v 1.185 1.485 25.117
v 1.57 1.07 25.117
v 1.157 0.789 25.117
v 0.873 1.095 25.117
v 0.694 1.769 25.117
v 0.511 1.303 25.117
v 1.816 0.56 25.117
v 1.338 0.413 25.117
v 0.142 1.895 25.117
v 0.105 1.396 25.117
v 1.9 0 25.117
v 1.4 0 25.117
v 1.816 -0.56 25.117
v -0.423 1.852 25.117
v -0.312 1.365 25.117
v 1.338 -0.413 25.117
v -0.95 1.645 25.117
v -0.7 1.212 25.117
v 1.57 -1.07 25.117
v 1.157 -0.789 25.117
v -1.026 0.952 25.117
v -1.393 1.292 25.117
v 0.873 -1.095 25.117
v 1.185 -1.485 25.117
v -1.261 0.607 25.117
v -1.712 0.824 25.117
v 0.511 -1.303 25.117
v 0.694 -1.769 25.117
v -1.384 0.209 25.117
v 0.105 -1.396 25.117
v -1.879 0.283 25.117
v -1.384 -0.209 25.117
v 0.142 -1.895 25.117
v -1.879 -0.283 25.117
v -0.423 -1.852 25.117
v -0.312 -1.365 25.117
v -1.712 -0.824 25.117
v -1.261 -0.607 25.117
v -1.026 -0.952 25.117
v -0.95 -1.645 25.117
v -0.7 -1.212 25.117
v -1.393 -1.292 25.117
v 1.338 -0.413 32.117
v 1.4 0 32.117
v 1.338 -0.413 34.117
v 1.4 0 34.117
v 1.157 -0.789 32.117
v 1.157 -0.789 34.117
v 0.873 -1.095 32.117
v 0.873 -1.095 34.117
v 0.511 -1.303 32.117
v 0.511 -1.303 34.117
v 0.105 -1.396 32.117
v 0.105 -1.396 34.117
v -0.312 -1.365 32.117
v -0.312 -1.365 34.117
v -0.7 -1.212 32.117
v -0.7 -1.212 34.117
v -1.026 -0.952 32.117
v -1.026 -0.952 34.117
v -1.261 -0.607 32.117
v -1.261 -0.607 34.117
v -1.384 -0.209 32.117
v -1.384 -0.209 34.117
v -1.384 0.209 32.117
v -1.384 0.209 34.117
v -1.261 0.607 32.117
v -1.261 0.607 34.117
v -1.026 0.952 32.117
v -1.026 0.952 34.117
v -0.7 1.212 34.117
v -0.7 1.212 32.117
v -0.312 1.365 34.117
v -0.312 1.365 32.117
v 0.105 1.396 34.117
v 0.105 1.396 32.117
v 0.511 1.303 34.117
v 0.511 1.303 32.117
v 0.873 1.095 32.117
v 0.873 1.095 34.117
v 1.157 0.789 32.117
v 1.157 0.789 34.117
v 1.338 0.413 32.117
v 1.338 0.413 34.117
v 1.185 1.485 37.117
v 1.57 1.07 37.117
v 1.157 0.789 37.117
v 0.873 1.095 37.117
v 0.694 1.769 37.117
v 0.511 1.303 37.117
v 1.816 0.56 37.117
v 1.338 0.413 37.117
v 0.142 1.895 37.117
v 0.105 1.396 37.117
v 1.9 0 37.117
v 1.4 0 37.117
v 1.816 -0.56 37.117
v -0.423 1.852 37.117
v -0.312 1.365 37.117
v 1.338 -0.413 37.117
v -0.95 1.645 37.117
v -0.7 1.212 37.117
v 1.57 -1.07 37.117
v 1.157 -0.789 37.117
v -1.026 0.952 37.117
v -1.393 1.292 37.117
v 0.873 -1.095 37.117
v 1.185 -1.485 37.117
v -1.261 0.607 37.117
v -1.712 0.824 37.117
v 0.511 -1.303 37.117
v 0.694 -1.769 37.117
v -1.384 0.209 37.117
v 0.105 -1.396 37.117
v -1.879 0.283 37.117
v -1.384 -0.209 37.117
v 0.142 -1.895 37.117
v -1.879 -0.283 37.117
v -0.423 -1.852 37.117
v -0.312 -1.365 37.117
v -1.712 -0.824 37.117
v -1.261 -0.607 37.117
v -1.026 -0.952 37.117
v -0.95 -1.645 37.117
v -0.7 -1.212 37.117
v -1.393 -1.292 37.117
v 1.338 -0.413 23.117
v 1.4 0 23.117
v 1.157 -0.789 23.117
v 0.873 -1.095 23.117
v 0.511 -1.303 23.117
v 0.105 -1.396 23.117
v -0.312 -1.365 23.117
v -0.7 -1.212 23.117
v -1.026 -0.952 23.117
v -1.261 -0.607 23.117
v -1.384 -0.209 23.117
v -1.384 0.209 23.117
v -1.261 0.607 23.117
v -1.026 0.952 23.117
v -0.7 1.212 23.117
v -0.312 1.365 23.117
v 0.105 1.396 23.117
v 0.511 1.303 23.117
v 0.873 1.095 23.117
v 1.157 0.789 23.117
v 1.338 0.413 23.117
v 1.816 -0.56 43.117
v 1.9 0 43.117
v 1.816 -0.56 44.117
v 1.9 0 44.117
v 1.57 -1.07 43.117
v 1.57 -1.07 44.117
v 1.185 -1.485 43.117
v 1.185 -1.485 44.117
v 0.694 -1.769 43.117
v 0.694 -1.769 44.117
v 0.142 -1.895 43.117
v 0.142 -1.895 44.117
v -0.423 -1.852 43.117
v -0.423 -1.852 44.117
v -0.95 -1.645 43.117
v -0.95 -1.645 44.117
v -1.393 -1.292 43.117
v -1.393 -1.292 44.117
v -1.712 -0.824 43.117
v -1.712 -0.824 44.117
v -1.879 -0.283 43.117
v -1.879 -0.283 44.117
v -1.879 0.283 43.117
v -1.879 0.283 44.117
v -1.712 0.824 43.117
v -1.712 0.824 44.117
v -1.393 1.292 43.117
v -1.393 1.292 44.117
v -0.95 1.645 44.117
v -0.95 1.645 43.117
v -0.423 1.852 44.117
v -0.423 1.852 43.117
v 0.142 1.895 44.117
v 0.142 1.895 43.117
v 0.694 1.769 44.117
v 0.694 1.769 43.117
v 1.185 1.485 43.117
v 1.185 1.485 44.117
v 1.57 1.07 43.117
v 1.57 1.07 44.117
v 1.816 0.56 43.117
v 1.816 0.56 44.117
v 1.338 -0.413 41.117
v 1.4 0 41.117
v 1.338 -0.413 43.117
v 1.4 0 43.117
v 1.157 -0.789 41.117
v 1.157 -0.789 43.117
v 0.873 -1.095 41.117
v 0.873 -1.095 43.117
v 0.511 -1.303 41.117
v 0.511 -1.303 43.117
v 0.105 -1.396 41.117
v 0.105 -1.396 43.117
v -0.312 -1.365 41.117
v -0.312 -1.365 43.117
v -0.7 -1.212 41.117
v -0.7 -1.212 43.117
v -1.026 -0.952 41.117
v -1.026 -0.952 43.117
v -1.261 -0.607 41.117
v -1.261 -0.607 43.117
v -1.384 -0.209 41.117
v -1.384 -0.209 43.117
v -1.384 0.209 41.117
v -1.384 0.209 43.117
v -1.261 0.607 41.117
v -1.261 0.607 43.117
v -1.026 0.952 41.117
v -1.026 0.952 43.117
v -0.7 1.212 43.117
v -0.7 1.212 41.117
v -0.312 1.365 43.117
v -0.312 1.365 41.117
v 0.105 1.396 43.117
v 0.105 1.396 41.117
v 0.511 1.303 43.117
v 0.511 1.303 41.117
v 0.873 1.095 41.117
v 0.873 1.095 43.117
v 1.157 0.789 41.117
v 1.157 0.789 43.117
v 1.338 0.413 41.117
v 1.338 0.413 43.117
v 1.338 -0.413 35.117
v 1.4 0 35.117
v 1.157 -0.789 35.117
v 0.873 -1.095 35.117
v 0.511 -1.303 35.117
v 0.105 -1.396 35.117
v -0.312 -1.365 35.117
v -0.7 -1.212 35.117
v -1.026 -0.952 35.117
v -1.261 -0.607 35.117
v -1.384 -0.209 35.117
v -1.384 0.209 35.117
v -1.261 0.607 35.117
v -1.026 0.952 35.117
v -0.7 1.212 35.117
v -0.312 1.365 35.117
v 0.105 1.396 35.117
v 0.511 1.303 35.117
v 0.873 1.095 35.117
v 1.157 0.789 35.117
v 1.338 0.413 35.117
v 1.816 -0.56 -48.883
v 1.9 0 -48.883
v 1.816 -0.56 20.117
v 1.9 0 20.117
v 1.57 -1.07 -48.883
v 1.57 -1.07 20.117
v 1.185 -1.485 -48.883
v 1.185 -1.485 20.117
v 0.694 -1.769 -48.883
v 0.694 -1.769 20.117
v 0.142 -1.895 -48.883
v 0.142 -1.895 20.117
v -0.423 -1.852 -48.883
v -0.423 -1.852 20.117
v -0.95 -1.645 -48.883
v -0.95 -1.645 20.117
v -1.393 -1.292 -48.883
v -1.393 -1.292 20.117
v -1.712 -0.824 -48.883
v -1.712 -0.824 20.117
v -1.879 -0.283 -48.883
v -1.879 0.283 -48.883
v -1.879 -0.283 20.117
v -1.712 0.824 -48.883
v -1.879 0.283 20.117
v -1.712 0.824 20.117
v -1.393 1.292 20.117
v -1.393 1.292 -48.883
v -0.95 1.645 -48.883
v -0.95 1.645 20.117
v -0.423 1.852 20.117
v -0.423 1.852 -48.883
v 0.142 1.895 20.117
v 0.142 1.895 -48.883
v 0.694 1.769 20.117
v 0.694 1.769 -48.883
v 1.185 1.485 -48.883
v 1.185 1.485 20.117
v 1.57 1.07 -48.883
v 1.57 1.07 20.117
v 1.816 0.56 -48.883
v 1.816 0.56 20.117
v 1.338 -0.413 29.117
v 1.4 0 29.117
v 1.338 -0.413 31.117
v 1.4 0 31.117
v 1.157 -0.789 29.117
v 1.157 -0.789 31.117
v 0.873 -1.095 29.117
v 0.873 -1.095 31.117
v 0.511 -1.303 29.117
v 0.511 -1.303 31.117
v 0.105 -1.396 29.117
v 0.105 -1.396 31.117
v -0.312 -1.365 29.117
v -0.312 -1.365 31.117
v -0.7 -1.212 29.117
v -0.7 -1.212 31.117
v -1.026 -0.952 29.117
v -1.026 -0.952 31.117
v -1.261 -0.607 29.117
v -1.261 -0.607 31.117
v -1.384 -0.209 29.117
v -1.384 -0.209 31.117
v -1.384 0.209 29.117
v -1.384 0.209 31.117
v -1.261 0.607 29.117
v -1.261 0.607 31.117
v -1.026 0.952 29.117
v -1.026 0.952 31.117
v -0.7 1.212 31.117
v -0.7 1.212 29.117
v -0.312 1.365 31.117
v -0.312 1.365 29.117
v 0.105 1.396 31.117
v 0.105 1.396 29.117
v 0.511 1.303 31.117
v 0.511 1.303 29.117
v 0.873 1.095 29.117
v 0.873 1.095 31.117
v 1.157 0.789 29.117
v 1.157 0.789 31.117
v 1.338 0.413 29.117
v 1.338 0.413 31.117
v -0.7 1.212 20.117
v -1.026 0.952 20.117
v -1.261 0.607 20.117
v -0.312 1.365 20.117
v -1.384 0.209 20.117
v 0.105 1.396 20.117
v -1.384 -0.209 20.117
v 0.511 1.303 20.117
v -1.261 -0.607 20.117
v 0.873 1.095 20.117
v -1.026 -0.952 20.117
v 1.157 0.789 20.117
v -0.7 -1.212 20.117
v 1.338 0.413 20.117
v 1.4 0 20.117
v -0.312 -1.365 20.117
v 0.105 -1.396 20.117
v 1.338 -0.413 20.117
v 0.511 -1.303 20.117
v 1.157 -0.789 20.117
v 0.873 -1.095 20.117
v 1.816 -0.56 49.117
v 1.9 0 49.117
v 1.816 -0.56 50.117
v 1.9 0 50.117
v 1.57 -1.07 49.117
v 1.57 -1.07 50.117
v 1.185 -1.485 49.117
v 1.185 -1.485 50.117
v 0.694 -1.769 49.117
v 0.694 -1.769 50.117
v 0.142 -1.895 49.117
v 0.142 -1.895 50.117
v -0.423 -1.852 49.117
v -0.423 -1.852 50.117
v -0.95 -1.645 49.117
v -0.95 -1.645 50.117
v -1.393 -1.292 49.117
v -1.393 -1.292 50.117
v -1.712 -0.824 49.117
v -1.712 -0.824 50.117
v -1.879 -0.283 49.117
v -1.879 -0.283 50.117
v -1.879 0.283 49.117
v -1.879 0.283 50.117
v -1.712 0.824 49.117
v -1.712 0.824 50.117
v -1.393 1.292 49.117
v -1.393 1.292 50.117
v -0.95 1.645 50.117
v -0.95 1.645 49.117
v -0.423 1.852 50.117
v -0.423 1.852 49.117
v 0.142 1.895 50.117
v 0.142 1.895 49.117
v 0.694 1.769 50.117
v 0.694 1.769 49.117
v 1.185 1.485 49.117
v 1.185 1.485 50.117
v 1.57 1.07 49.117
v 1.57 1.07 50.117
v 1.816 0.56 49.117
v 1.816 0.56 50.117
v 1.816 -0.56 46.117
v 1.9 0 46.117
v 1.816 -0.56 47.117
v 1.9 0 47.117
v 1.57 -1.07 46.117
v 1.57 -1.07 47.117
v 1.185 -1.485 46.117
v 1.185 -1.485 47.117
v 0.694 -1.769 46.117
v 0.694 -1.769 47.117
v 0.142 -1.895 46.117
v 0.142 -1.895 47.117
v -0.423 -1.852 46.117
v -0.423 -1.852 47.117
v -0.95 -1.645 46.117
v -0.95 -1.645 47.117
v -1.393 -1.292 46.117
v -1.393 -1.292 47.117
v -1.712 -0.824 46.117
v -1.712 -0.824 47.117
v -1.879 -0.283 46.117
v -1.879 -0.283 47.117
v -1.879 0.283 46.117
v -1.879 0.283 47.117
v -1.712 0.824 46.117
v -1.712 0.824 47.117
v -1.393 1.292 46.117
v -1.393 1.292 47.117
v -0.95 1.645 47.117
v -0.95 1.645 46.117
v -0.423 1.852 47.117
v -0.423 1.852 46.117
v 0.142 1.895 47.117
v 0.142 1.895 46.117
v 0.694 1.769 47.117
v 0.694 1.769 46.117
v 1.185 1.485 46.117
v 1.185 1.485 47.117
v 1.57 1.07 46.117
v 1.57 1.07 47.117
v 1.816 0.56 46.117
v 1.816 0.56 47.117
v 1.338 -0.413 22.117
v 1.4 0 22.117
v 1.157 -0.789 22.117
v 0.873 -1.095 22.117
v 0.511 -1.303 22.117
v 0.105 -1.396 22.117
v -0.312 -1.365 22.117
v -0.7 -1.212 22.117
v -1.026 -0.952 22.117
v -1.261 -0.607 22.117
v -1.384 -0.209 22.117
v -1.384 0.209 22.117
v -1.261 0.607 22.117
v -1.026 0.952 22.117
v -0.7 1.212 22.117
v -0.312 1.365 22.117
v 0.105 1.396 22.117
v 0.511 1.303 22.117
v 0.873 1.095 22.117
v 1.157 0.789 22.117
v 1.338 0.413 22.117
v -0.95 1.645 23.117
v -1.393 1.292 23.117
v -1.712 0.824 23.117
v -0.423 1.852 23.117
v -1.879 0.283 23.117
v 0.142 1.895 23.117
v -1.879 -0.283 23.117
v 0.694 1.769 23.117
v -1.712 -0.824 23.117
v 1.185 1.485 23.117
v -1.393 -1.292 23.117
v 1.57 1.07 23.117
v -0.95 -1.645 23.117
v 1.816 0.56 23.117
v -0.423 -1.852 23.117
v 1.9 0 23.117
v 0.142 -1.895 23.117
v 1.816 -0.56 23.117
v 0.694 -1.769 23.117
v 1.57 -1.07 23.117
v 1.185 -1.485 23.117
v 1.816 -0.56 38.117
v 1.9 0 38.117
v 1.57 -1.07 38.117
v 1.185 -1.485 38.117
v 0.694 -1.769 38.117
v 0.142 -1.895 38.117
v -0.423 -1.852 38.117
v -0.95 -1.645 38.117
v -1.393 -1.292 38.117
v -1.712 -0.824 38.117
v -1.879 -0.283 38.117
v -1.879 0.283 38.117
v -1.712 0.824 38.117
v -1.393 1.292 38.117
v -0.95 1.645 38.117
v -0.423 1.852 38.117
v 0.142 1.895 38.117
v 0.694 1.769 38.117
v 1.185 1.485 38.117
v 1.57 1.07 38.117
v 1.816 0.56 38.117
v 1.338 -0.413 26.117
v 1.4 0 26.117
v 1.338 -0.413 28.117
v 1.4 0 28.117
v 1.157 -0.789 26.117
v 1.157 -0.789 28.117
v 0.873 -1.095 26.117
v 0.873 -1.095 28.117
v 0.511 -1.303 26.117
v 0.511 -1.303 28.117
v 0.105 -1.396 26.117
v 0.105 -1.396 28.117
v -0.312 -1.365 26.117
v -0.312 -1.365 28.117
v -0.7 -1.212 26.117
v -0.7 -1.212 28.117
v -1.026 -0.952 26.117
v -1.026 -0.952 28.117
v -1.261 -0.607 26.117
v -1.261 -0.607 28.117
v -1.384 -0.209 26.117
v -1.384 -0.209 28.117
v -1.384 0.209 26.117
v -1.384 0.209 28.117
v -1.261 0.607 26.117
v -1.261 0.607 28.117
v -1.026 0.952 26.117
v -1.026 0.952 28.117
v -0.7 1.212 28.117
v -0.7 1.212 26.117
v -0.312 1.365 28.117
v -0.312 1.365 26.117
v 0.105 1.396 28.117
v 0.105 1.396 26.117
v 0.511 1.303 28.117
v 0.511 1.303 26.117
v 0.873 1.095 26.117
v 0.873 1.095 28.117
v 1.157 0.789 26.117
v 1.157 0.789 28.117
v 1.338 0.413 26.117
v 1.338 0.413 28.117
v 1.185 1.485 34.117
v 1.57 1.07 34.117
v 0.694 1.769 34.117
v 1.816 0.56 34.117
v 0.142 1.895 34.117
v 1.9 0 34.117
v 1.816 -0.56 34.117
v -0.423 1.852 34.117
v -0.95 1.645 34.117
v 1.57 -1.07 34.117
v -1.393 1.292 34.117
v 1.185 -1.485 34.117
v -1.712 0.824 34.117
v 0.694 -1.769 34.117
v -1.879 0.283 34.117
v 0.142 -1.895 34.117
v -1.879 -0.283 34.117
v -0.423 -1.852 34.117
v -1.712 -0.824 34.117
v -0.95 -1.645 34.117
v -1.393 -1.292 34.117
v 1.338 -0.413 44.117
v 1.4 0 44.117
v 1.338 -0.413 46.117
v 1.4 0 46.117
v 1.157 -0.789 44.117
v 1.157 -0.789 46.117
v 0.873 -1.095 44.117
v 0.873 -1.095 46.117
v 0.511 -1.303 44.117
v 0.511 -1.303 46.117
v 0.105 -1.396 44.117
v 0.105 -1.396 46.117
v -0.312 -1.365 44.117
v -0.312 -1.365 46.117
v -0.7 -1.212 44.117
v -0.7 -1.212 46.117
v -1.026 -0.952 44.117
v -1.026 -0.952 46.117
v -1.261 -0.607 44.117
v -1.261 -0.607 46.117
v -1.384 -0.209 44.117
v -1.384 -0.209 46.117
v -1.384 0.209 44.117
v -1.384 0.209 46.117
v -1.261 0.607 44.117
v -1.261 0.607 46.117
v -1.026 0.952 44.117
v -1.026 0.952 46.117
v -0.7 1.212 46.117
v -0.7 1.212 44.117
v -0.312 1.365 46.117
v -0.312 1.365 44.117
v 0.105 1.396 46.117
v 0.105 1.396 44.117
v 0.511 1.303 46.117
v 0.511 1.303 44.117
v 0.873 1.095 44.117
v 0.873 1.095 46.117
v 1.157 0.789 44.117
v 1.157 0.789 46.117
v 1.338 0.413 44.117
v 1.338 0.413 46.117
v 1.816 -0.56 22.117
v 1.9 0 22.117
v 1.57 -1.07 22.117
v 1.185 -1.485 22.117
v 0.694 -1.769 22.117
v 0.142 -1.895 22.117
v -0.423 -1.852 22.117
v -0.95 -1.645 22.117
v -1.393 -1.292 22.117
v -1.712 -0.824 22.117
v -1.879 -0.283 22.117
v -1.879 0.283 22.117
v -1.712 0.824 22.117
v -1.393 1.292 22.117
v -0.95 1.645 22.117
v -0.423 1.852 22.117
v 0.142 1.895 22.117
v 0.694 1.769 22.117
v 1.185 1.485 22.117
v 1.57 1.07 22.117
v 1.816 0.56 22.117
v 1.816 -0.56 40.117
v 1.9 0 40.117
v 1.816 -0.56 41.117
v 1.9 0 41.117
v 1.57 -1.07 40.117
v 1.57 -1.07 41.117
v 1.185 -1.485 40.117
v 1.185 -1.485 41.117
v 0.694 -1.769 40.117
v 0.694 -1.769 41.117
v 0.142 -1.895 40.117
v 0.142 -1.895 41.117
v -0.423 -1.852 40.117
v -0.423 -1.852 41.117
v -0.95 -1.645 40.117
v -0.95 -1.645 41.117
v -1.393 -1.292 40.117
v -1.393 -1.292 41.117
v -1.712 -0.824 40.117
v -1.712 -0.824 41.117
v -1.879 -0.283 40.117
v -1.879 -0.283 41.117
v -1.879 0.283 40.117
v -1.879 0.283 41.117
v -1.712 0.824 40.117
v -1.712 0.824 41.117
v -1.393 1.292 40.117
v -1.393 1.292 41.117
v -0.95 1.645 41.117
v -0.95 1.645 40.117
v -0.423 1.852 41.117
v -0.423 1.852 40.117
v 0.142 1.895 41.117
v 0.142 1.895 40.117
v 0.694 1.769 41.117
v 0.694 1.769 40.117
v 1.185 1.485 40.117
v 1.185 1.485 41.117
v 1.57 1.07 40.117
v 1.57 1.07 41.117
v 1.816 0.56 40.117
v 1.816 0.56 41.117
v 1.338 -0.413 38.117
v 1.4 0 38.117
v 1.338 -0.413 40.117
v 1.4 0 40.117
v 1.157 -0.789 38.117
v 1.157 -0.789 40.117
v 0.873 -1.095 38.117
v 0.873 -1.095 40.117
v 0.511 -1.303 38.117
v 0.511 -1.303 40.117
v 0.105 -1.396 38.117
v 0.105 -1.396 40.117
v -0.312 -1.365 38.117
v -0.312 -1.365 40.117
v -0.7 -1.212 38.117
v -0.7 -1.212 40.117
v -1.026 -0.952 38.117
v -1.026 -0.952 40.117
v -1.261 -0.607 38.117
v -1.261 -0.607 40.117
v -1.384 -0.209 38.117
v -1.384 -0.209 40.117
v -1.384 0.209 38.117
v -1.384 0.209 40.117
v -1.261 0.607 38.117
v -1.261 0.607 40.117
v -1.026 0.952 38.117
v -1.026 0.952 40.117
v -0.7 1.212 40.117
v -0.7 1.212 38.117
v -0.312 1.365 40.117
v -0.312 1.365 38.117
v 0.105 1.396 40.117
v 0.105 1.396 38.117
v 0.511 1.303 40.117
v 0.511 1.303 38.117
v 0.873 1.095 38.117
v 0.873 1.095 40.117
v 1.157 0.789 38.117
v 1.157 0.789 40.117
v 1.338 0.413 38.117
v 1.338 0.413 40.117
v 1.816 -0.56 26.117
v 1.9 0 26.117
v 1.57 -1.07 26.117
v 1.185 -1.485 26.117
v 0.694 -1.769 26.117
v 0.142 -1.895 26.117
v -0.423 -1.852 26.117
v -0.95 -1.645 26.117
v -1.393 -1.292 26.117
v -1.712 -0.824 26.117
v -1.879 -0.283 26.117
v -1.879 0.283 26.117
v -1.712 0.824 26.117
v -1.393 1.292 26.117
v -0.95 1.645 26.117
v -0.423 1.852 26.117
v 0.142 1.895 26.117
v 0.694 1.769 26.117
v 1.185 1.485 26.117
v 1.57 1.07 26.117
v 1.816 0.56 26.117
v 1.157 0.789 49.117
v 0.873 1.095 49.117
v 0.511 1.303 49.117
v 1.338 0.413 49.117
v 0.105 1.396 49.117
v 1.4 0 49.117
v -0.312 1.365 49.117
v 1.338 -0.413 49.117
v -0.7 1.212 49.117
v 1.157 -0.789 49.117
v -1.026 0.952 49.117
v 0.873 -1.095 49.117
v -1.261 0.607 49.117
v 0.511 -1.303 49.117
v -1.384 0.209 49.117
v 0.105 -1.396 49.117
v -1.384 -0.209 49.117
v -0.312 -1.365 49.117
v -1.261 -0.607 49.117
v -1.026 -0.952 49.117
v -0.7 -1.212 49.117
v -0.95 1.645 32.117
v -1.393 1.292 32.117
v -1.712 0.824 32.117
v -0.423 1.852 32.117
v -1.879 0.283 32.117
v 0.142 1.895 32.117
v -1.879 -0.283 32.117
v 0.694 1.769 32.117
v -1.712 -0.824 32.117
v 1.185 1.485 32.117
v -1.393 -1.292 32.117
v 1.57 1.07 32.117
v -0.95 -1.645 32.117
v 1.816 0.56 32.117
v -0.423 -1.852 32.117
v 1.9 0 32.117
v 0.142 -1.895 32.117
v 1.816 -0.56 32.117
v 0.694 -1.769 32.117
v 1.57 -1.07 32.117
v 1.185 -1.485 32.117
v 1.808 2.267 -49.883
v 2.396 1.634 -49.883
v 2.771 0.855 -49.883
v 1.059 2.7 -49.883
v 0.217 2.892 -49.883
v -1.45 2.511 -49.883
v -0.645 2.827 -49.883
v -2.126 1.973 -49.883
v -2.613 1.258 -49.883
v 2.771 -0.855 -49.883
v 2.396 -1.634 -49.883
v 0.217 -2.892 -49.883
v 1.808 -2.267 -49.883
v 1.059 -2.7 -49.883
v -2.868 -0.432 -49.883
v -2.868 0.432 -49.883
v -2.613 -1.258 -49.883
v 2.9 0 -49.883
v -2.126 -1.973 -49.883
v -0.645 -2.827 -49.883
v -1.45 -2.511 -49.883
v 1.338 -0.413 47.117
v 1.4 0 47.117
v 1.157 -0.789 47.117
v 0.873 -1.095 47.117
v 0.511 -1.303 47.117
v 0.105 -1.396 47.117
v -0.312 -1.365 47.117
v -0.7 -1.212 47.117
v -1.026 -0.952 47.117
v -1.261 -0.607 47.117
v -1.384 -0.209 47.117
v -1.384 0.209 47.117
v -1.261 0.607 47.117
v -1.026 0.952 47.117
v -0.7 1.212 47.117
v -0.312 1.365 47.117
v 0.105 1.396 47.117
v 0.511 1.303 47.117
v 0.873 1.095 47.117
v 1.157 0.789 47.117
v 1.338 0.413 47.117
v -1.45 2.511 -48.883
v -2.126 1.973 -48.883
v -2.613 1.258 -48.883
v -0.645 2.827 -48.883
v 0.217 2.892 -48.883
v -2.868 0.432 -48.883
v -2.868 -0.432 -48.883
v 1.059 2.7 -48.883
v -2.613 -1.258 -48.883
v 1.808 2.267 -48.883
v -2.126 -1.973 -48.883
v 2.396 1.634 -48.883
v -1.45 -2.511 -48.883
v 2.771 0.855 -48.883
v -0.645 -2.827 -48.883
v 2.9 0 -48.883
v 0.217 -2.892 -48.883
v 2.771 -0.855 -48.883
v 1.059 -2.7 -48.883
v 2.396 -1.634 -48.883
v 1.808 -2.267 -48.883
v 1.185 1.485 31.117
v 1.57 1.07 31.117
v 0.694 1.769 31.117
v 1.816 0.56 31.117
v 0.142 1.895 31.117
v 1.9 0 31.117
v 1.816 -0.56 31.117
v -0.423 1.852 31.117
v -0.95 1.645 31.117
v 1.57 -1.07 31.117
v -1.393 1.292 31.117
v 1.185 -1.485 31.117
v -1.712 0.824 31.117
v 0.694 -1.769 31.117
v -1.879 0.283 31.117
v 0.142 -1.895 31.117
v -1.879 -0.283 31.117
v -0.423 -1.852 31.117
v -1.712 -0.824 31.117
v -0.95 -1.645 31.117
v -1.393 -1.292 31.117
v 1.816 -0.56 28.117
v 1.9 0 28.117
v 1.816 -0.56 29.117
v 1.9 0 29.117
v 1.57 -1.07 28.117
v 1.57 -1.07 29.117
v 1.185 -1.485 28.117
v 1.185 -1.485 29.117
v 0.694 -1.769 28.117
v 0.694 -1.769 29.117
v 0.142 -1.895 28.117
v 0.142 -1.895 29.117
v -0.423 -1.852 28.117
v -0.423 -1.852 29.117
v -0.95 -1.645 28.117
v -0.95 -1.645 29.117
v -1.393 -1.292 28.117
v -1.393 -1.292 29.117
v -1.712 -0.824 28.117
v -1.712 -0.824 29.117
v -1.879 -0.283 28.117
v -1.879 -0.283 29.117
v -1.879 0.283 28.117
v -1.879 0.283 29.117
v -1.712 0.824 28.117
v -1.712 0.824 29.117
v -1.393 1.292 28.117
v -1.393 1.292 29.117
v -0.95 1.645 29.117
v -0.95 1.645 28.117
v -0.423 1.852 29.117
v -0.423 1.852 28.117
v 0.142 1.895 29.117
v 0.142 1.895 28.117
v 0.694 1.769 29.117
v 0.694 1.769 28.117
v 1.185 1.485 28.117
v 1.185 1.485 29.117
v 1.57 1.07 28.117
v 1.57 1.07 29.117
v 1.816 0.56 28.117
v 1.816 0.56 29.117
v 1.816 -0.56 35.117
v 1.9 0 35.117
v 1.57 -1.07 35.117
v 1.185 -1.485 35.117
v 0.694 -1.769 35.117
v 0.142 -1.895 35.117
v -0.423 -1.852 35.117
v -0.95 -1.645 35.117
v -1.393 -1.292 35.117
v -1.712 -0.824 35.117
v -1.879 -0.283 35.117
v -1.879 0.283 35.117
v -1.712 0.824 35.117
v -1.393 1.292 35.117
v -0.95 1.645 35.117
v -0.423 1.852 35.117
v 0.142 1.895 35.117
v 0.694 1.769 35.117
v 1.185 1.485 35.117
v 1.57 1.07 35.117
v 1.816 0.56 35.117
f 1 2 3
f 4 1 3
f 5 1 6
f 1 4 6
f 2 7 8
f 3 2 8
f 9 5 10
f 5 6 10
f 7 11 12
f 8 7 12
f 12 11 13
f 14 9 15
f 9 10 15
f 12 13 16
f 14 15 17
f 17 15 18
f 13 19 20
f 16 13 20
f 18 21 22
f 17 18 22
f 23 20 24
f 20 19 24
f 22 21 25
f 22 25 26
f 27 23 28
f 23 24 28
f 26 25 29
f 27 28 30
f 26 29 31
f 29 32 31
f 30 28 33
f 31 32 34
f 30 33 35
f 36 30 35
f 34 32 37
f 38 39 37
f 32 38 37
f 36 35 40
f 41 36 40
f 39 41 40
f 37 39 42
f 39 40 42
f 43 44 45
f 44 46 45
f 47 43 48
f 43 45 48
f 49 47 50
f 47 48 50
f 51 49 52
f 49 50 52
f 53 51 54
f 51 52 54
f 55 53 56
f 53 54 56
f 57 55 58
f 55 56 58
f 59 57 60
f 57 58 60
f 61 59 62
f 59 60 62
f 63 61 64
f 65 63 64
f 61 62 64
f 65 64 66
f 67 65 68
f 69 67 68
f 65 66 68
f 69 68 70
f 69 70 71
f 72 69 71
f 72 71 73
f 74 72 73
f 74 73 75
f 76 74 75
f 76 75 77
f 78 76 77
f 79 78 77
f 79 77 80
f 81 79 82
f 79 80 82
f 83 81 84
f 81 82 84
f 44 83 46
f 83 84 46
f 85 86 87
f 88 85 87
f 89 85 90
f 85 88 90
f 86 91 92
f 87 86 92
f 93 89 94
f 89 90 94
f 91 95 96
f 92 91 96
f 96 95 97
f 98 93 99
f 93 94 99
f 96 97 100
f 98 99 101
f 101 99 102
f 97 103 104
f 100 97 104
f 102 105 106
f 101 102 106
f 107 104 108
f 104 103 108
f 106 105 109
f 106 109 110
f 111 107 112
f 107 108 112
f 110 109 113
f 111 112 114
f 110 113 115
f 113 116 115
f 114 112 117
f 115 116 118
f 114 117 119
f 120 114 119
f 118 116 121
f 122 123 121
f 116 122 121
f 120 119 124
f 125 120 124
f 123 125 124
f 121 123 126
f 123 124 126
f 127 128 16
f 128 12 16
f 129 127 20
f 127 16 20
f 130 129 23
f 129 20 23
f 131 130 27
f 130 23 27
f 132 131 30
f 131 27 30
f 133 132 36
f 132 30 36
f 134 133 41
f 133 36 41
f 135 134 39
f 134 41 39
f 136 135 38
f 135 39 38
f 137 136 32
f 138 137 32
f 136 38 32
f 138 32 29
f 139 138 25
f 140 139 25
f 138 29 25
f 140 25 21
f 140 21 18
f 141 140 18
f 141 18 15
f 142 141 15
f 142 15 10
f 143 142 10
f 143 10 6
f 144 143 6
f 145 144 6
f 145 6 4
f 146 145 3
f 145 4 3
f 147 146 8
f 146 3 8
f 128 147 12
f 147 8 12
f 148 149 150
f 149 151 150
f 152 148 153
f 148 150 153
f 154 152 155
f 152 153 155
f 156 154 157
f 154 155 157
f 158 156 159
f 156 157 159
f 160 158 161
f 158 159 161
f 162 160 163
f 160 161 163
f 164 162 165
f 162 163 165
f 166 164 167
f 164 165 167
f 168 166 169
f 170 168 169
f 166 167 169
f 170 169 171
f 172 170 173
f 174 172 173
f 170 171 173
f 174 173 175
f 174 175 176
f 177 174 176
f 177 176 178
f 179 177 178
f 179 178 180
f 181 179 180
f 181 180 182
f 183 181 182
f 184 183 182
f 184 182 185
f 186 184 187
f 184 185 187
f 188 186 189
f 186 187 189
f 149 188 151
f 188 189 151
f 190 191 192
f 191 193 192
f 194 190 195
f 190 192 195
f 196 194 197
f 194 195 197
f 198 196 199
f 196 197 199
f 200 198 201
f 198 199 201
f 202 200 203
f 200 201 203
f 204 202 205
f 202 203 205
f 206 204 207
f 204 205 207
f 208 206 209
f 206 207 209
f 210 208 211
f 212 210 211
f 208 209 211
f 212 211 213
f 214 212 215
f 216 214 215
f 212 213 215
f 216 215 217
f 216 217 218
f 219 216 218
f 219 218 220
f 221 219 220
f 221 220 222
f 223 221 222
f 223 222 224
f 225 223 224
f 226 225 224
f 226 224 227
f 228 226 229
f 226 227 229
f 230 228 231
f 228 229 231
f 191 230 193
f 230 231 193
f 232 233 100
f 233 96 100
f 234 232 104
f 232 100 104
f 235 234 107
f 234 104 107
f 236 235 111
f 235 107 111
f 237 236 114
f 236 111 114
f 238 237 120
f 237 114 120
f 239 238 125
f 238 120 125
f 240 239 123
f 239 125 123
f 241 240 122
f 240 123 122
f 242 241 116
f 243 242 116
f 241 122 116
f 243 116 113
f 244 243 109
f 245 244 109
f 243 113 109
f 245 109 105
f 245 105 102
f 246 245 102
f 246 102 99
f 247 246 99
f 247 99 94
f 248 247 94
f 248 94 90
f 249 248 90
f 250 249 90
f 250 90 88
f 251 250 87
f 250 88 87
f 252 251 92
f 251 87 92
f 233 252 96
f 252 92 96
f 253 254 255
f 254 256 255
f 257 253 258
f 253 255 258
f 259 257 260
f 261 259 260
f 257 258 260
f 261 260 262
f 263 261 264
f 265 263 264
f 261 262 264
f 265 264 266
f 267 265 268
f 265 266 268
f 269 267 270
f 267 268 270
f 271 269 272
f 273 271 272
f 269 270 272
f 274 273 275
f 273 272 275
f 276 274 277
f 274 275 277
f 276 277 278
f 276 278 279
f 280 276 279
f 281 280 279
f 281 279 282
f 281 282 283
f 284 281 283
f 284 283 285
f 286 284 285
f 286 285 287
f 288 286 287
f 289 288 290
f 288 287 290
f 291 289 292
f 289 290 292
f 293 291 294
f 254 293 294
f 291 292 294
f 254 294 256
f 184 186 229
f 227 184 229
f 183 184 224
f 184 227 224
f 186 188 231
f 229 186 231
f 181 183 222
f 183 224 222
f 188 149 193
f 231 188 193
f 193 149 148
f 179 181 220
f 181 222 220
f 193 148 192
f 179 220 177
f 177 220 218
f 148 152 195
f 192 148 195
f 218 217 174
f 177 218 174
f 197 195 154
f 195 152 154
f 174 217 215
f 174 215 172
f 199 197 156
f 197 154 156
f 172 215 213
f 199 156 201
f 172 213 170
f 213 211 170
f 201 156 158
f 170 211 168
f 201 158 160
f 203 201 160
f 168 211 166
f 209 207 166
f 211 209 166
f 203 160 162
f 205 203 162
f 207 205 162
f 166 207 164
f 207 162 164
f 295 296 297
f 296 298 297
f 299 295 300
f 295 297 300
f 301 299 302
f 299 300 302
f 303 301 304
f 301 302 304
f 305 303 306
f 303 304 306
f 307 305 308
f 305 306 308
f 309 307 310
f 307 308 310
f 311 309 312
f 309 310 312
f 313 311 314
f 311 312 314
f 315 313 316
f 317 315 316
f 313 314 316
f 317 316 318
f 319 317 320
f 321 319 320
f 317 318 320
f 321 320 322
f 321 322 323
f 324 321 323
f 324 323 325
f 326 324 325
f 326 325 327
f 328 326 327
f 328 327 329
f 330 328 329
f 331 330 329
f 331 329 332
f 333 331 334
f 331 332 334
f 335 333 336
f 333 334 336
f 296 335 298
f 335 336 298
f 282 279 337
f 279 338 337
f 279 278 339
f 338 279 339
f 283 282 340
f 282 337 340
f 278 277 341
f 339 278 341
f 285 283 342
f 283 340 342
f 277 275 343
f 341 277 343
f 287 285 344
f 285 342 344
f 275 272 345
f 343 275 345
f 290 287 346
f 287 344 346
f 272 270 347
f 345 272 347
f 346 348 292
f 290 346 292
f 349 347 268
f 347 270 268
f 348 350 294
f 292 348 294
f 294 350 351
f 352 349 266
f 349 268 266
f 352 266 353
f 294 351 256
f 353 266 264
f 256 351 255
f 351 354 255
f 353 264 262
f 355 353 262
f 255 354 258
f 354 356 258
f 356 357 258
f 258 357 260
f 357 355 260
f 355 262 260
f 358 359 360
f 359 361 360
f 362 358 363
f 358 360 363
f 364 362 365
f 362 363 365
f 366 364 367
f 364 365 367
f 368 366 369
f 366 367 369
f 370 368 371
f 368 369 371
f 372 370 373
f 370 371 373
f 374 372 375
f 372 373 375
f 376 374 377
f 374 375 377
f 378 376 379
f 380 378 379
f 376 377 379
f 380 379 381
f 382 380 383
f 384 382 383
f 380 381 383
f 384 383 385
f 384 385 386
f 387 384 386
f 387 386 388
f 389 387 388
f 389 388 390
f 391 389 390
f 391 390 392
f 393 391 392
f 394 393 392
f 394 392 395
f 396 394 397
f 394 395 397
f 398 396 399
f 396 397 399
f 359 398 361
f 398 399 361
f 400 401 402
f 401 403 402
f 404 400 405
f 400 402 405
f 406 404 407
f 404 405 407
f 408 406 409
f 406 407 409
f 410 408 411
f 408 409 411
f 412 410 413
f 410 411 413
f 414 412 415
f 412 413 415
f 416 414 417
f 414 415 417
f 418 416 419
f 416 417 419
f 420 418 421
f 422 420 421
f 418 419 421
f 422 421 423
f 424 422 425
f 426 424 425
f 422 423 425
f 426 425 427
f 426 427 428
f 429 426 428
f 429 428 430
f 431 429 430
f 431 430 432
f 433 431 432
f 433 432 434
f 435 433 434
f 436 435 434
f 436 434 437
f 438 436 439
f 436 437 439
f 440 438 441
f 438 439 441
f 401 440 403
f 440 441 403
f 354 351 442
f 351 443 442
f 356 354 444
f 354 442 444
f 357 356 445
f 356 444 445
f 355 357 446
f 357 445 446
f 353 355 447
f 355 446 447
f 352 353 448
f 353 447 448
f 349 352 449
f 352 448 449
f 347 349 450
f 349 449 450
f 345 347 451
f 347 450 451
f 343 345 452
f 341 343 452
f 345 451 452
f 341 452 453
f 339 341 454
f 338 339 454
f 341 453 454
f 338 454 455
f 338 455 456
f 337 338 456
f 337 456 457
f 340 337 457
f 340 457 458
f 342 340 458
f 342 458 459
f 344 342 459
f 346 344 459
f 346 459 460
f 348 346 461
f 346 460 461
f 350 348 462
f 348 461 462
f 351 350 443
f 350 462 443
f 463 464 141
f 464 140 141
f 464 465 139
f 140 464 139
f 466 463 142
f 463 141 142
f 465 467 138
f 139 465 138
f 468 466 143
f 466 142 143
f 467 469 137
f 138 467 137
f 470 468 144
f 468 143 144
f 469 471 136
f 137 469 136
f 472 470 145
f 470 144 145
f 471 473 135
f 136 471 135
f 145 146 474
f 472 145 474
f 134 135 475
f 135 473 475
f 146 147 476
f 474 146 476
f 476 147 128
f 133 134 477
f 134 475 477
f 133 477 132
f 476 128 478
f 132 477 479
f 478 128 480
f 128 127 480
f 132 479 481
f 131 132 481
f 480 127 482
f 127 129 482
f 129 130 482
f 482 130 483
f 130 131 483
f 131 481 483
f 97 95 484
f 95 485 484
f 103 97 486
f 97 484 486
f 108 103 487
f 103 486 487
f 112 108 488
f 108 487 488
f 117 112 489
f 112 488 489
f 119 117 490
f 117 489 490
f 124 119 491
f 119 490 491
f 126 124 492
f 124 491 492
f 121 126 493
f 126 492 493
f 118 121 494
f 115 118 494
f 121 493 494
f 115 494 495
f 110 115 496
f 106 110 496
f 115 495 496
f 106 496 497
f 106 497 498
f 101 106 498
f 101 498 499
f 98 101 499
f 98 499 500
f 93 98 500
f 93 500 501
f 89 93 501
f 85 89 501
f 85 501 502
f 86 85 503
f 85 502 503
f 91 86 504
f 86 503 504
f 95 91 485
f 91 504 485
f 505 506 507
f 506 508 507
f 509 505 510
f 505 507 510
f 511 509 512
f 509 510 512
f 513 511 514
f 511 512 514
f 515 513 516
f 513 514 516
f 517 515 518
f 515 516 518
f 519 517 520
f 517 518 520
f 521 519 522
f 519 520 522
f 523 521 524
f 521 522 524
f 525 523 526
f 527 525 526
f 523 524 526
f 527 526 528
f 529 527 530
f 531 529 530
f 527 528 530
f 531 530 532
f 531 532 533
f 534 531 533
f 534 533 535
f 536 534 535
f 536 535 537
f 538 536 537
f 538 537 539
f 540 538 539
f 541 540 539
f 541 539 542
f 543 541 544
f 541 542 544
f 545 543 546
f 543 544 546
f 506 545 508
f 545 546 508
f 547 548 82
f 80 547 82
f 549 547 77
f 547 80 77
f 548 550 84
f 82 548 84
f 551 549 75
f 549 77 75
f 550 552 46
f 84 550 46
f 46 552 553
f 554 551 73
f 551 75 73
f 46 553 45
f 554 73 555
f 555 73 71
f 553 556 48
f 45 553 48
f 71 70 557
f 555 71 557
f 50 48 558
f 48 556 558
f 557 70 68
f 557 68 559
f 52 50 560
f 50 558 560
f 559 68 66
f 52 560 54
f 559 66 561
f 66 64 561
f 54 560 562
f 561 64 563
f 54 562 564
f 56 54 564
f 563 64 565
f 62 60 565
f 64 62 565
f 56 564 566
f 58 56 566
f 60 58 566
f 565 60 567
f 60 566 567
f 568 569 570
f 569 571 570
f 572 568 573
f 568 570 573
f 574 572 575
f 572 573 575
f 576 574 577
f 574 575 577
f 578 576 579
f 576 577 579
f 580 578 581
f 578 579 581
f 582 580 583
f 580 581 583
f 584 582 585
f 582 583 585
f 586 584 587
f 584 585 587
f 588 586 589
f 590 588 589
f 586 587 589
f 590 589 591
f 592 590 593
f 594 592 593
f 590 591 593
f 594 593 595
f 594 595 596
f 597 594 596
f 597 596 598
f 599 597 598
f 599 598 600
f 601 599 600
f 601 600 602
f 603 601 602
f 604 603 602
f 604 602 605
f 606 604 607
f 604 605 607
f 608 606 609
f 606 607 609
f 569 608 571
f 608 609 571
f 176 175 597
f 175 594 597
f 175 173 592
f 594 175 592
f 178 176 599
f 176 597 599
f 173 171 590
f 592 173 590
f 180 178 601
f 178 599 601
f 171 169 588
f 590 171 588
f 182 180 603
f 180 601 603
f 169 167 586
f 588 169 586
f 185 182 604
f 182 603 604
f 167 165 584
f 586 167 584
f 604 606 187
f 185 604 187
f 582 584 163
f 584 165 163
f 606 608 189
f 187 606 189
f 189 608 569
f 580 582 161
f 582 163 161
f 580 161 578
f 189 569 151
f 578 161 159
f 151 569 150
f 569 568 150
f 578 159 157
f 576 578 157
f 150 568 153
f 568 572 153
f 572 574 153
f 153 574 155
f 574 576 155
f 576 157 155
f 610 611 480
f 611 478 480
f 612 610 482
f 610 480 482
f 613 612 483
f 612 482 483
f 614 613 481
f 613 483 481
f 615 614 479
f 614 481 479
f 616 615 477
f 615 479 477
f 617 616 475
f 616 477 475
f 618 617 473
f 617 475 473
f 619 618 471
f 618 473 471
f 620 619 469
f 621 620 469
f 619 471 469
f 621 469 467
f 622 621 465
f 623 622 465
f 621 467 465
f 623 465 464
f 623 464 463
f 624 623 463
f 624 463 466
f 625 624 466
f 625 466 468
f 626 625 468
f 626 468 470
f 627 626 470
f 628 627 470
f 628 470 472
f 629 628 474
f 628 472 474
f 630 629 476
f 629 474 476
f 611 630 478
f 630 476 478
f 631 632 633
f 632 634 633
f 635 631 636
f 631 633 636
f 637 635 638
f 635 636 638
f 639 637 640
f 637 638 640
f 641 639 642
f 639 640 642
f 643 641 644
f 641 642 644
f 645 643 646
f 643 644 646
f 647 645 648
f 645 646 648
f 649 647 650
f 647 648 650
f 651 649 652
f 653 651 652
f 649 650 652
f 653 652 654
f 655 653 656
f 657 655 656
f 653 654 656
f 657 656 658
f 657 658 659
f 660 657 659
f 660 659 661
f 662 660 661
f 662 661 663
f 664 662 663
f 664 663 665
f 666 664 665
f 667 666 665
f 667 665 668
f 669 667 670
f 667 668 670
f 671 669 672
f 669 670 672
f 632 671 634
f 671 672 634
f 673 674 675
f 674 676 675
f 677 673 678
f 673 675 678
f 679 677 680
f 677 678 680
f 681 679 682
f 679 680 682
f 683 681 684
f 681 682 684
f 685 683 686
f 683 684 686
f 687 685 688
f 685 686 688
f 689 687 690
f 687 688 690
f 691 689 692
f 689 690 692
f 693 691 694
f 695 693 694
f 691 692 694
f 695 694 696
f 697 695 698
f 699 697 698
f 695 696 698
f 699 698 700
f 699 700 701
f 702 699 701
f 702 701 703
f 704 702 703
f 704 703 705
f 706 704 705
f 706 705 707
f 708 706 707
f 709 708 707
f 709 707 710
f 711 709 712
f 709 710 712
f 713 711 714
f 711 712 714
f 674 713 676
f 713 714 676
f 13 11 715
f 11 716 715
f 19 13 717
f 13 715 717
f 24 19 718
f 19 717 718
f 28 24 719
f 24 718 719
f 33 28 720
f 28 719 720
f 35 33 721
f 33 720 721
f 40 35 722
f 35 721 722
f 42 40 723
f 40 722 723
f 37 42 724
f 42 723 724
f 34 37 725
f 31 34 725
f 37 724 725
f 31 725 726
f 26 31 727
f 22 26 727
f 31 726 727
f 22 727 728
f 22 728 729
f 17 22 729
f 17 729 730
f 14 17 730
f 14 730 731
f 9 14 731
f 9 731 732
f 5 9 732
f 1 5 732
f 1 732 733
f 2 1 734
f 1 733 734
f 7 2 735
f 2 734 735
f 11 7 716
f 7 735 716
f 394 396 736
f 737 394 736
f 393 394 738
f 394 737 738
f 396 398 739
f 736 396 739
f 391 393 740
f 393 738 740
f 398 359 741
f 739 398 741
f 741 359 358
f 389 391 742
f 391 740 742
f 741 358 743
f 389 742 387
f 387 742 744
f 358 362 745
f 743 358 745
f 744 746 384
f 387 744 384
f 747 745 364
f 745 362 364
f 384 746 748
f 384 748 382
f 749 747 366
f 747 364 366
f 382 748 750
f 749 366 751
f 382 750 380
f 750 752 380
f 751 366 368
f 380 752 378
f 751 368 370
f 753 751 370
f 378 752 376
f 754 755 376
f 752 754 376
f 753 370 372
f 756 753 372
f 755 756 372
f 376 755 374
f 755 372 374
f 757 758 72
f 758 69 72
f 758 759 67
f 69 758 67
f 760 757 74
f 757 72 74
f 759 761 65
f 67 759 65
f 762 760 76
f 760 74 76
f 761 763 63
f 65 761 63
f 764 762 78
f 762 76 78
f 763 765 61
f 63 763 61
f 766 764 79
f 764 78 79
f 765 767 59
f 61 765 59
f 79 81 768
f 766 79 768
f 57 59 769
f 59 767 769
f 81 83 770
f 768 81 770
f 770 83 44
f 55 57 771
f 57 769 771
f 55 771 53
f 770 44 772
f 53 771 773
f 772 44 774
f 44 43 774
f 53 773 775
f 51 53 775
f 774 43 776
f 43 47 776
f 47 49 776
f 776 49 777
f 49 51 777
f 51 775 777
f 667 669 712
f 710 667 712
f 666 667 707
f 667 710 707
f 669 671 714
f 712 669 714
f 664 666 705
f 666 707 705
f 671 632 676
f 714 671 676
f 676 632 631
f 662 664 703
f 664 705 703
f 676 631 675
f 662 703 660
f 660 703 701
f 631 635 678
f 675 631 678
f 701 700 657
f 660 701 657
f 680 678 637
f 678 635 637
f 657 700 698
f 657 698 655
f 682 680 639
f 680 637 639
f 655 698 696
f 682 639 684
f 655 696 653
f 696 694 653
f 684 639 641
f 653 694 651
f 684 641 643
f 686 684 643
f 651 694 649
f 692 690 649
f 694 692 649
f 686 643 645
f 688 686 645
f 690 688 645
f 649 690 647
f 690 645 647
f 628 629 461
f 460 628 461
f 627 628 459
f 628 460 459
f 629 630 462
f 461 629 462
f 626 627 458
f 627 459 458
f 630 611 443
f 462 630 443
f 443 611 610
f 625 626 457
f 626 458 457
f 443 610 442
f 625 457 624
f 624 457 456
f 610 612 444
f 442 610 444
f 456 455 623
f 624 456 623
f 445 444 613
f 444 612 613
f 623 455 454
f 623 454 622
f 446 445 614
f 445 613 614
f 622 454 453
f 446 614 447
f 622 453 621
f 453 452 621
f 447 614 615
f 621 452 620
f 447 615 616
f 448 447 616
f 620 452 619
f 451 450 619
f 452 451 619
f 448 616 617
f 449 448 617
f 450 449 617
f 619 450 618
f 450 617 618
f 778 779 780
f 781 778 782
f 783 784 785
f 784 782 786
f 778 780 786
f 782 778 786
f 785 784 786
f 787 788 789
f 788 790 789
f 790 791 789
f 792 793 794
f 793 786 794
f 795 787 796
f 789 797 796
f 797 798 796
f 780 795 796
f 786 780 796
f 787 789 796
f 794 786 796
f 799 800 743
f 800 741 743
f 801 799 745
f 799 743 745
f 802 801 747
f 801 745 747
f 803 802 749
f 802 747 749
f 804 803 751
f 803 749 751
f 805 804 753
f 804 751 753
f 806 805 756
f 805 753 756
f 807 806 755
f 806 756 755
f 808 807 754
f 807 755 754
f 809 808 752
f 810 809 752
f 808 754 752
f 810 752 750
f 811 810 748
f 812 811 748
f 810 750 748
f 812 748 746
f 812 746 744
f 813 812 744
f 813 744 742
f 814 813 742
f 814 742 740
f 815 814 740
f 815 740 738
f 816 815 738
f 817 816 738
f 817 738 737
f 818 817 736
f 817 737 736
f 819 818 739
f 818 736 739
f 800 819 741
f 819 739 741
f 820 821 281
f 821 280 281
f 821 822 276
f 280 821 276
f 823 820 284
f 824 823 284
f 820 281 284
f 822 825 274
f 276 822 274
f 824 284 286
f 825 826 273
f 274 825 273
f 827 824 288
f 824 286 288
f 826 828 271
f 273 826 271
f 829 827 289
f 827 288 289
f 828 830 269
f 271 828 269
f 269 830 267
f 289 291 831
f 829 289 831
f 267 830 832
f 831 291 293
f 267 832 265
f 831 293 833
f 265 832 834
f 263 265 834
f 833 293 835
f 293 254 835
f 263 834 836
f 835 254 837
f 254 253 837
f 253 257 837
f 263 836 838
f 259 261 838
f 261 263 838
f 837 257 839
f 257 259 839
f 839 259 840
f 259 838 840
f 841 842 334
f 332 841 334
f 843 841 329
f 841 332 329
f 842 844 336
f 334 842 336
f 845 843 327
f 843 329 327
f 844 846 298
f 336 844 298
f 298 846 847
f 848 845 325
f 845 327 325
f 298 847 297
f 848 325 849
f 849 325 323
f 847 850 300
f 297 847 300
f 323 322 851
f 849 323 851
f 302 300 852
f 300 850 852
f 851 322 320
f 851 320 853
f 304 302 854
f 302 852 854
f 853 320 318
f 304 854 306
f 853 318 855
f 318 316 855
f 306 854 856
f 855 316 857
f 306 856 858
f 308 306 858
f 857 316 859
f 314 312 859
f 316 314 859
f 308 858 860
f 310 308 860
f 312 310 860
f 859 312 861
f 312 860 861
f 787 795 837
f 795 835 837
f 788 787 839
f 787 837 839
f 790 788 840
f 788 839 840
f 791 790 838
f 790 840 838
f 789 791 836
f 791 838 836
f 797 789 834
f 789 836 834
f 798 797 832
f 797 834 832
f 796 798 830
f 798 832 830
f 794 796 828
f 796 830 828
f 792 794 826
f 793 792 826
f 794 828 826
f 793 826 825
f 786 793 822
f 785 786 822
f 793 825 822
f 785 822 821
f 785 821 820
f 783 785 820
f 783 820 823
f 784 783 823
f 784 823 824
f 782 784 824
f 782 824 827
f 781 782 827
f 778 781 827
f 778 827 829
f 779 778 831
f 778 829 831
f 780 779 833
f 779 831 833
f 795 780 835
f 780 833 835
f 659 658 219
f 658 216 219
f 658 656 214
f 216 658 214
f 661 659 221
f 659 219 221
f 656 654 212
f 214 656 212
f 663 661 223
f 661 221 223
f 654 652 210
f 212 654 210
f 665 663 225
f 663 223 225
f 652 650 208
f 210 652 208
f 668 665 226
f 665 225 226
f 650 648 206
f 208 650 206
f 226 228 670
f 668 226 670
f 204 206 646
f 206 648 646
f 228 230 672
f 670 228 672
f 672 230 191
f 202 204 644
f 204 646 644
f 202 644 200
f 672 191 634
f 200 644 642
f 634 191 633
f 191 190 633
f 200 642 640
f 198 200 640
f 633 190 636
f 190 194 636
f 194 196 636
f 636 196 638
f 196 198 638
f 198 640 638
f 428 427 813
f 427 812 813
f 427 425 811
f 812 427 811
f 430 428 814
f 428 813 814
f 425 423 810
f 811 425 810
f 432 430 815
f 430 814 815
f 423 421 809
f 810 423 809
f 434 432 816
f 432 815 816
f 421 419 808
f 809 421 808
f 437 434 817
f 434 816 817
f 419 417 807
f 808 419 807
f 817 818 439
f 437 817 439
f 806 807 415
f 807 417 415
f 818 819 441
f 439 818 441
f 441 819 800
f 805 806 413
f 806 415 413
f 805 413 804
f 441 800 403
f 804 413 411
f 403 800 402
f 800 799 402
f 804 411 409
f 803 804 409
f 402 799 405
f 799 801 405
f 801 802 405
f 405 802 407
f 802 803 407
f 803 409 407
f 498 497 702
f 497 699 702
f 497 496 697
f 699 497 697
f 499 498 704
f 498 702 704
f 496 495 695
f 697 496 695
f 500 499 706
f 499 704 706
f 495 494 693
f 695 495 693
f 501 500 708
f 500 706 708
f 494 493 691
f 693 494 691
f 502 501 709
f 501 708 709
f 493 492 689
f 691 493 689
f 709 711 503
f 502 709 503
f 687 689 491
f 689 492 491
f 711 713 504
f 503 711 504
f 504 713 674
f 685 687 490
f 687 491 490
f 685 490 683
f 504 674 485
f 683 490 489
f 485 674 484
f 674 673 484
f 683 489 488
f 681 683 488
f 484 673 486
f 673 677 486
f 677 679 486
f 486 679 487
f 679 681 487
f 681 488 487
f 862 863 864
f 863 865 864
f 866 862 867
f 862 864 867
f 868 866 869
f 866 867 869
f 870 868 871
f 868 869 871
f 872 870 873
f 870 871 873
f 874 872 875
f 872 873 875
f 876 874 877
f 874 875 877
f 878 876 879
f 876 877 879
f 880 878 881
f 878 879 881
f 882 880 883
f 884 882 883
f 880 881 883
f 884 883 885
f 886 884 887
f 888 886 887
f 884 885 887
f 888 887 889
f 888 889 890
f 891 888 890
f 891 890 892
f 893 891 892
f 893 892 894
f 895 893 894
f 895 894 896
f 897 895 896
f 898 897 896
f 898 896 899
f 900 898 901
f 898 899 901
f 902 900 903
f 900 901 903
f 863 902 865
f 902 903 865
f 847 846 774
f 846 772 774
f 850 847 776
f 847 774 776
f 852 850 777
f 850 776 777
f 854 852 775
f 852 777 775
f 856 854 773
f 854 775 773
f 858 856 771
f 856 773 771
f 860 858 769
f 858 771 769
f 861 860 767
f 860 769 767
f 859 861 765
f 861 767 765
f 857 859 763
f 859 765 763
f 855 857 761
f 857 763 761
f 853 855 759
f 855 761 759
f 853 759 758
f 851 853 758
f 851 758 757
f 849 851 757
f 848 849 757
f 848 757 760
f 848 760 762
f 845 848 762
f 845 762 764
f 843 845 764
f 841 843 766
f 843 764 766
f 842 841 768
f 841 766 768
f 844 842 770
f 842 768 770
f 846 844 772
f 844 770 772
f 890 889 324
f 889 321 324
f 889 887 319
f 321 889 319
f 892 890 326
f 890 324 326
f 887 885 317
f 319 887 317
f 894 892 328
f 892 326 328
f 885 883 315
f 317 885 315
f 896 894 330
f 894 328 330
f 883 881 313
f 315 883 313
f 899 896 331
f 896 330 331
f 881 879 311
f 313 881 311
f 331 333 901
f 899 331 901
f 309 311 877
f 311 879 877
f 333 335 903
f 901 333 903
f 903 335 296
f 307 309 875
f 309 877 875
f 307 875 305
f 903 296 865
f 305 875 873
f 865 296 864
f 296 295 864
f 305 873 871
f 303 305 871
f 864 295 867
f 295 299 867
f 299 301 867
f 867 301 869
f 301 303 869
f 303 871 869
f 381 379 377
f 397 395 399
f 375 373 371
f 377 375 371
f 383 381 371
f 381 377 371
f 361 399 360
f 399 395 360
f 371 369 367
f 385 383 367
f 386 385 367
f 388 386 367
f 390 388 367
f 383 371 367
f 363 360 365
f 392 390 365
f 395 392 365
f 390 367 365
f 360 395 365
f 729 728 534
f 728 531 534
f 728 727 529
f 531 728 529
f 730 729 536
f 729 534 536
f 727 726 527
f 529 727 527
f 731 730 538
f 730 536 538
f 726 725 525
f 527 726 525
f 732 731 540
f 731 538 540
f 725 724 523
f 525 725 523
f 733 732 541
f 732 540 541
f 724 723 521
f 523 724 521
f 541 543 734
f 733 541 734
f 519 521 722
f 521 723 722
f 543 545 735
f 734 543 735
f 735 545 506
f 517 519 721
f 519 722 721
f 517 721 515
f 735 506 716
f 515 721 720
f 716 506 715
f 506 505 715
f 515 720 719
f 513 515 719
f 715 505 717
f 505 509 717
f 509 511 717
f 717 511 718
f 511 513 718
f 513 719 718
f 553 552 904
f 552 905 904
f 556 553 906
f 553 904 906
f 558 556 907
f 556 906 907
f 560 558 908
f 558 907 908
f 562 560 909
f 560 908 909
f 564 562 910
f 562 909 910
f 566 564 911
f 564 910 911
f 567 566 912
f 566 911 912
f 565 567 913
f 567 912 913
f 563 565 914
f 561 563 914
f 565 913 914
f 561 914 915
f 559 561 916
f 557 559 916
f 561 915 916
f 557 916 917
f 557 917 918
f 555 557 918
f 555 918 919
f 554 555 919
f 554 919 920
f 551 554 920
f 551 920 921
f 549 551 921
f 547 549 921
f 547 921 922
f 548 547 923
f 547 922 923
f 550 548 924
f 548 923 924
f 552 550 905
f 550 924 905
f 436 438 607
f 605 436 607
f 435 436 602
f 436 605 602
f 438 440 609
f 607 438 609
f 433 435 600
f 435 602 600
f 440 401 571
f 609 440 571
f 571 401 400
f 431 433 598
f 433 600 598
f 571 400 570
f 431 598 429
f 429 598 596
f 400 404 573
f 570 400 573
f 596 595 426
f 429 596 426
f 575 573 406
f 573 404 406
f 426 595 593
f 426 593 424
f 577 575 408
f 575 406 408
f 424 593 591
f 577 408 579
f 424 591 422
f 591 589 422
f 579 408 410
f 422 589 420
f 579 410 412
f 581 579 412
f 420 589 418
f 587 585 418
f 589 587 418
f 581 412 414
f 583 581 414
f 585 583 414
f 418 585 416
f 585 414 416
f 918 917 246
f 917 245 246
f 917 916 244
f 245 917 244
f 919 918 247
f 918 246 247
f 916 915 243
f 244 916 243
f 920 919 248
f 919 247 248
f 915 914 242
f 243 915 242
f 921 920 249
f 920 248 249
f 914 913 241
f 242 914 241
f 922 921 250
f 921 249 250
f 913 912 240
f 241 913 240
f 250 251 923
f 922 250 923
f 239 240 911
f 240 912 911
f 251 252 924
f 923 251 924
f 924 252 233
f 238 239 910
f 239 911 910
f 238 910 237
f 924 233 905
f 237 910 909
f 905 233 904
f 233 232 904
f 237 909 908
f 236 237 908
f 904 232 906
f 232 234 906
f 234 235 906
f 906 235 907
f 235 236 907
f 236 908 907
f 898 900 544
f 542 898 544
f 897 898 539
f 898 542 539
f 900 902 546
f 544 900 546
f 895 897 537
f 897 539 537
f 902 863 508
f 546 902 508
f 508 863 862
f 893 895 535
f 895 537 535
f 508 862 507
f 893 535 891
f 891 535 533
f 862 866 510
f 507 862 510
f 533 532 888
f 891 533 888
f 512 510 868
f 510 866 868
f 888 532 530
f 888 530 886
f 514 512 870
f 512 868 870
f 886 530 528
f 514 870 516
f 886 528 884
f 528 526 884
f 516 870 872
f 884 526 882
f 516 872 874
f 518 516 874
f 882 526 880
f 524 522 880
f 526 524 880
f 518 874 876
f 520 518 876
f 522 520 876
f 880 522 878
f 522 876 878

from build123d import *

# Parameters (mm, degrees)
F0_W   = 1
F0_H   = 1
F0_W_2 = 0.5
F0_H_2 = 2


with BuildPart() as f1:
    # F0 (on Front) → F1 (revolve)
    with BuildSketch(Plane.XZ):
        Polygon((1.9, 50.117493), (0, 50.117493), (0, -49.882507), (1.9, -49.882507), (1.9, -48.882507), (1.4, -48.882507), (1.4, -46.882507), (1.9, -46.882507), (1.9, 19.117493), (1.9, 20.117493), (1.4, 20.117493), (1.4, 22.117493), (1.9, 22.117493), (1.9, 23.117493), (1.4, 23.117493), (1.4, 25.117493), (1.9, 25.117493), (1.9, 26.117493), (1.4, 26.117493), (1.4, 28.117493), (1.9, 28.117493), (1.9, 29.117493), (1.4, 29.117493), (1.4, 31.117493), (1.9, 31.117493), (1.9, 32.117493), (1.4, 32.117493), (1.4, 34.117493), (1.9, 34.117493), (1.9, 34.617493), (1.9, 35.117493), (1.4, 35.117493), (1.4, 37.117493), (1.9, 37.117493), (1.9, 38.117493), (1.4, 38.117493), (1.4, 40.117493), (1.9, 40.117493), (1.9, 41.117493), (1.4, 41.117493), (1.4, 43.117493), (1.9, 43.117493), (1.9, 44.117493), (1.4, 44.117493), (1.4, 46.117493), (1.9, 46.117493), (1.9, 47.117493), (1.4, 47.117493), (1.4, 49.117493), (1.9, 49.117493), align=None)
        with Locations((2.4, -49.382507)):
            Rectangle(F0_W, F0_H)
        with Locations((1.65, -47.882507)):
            Rectangle(F0_W_2, F0_H_2)
    revolve(axis=Axis((0, 0, 0.117493), (0, 0, -1)))


solid = f1.part
